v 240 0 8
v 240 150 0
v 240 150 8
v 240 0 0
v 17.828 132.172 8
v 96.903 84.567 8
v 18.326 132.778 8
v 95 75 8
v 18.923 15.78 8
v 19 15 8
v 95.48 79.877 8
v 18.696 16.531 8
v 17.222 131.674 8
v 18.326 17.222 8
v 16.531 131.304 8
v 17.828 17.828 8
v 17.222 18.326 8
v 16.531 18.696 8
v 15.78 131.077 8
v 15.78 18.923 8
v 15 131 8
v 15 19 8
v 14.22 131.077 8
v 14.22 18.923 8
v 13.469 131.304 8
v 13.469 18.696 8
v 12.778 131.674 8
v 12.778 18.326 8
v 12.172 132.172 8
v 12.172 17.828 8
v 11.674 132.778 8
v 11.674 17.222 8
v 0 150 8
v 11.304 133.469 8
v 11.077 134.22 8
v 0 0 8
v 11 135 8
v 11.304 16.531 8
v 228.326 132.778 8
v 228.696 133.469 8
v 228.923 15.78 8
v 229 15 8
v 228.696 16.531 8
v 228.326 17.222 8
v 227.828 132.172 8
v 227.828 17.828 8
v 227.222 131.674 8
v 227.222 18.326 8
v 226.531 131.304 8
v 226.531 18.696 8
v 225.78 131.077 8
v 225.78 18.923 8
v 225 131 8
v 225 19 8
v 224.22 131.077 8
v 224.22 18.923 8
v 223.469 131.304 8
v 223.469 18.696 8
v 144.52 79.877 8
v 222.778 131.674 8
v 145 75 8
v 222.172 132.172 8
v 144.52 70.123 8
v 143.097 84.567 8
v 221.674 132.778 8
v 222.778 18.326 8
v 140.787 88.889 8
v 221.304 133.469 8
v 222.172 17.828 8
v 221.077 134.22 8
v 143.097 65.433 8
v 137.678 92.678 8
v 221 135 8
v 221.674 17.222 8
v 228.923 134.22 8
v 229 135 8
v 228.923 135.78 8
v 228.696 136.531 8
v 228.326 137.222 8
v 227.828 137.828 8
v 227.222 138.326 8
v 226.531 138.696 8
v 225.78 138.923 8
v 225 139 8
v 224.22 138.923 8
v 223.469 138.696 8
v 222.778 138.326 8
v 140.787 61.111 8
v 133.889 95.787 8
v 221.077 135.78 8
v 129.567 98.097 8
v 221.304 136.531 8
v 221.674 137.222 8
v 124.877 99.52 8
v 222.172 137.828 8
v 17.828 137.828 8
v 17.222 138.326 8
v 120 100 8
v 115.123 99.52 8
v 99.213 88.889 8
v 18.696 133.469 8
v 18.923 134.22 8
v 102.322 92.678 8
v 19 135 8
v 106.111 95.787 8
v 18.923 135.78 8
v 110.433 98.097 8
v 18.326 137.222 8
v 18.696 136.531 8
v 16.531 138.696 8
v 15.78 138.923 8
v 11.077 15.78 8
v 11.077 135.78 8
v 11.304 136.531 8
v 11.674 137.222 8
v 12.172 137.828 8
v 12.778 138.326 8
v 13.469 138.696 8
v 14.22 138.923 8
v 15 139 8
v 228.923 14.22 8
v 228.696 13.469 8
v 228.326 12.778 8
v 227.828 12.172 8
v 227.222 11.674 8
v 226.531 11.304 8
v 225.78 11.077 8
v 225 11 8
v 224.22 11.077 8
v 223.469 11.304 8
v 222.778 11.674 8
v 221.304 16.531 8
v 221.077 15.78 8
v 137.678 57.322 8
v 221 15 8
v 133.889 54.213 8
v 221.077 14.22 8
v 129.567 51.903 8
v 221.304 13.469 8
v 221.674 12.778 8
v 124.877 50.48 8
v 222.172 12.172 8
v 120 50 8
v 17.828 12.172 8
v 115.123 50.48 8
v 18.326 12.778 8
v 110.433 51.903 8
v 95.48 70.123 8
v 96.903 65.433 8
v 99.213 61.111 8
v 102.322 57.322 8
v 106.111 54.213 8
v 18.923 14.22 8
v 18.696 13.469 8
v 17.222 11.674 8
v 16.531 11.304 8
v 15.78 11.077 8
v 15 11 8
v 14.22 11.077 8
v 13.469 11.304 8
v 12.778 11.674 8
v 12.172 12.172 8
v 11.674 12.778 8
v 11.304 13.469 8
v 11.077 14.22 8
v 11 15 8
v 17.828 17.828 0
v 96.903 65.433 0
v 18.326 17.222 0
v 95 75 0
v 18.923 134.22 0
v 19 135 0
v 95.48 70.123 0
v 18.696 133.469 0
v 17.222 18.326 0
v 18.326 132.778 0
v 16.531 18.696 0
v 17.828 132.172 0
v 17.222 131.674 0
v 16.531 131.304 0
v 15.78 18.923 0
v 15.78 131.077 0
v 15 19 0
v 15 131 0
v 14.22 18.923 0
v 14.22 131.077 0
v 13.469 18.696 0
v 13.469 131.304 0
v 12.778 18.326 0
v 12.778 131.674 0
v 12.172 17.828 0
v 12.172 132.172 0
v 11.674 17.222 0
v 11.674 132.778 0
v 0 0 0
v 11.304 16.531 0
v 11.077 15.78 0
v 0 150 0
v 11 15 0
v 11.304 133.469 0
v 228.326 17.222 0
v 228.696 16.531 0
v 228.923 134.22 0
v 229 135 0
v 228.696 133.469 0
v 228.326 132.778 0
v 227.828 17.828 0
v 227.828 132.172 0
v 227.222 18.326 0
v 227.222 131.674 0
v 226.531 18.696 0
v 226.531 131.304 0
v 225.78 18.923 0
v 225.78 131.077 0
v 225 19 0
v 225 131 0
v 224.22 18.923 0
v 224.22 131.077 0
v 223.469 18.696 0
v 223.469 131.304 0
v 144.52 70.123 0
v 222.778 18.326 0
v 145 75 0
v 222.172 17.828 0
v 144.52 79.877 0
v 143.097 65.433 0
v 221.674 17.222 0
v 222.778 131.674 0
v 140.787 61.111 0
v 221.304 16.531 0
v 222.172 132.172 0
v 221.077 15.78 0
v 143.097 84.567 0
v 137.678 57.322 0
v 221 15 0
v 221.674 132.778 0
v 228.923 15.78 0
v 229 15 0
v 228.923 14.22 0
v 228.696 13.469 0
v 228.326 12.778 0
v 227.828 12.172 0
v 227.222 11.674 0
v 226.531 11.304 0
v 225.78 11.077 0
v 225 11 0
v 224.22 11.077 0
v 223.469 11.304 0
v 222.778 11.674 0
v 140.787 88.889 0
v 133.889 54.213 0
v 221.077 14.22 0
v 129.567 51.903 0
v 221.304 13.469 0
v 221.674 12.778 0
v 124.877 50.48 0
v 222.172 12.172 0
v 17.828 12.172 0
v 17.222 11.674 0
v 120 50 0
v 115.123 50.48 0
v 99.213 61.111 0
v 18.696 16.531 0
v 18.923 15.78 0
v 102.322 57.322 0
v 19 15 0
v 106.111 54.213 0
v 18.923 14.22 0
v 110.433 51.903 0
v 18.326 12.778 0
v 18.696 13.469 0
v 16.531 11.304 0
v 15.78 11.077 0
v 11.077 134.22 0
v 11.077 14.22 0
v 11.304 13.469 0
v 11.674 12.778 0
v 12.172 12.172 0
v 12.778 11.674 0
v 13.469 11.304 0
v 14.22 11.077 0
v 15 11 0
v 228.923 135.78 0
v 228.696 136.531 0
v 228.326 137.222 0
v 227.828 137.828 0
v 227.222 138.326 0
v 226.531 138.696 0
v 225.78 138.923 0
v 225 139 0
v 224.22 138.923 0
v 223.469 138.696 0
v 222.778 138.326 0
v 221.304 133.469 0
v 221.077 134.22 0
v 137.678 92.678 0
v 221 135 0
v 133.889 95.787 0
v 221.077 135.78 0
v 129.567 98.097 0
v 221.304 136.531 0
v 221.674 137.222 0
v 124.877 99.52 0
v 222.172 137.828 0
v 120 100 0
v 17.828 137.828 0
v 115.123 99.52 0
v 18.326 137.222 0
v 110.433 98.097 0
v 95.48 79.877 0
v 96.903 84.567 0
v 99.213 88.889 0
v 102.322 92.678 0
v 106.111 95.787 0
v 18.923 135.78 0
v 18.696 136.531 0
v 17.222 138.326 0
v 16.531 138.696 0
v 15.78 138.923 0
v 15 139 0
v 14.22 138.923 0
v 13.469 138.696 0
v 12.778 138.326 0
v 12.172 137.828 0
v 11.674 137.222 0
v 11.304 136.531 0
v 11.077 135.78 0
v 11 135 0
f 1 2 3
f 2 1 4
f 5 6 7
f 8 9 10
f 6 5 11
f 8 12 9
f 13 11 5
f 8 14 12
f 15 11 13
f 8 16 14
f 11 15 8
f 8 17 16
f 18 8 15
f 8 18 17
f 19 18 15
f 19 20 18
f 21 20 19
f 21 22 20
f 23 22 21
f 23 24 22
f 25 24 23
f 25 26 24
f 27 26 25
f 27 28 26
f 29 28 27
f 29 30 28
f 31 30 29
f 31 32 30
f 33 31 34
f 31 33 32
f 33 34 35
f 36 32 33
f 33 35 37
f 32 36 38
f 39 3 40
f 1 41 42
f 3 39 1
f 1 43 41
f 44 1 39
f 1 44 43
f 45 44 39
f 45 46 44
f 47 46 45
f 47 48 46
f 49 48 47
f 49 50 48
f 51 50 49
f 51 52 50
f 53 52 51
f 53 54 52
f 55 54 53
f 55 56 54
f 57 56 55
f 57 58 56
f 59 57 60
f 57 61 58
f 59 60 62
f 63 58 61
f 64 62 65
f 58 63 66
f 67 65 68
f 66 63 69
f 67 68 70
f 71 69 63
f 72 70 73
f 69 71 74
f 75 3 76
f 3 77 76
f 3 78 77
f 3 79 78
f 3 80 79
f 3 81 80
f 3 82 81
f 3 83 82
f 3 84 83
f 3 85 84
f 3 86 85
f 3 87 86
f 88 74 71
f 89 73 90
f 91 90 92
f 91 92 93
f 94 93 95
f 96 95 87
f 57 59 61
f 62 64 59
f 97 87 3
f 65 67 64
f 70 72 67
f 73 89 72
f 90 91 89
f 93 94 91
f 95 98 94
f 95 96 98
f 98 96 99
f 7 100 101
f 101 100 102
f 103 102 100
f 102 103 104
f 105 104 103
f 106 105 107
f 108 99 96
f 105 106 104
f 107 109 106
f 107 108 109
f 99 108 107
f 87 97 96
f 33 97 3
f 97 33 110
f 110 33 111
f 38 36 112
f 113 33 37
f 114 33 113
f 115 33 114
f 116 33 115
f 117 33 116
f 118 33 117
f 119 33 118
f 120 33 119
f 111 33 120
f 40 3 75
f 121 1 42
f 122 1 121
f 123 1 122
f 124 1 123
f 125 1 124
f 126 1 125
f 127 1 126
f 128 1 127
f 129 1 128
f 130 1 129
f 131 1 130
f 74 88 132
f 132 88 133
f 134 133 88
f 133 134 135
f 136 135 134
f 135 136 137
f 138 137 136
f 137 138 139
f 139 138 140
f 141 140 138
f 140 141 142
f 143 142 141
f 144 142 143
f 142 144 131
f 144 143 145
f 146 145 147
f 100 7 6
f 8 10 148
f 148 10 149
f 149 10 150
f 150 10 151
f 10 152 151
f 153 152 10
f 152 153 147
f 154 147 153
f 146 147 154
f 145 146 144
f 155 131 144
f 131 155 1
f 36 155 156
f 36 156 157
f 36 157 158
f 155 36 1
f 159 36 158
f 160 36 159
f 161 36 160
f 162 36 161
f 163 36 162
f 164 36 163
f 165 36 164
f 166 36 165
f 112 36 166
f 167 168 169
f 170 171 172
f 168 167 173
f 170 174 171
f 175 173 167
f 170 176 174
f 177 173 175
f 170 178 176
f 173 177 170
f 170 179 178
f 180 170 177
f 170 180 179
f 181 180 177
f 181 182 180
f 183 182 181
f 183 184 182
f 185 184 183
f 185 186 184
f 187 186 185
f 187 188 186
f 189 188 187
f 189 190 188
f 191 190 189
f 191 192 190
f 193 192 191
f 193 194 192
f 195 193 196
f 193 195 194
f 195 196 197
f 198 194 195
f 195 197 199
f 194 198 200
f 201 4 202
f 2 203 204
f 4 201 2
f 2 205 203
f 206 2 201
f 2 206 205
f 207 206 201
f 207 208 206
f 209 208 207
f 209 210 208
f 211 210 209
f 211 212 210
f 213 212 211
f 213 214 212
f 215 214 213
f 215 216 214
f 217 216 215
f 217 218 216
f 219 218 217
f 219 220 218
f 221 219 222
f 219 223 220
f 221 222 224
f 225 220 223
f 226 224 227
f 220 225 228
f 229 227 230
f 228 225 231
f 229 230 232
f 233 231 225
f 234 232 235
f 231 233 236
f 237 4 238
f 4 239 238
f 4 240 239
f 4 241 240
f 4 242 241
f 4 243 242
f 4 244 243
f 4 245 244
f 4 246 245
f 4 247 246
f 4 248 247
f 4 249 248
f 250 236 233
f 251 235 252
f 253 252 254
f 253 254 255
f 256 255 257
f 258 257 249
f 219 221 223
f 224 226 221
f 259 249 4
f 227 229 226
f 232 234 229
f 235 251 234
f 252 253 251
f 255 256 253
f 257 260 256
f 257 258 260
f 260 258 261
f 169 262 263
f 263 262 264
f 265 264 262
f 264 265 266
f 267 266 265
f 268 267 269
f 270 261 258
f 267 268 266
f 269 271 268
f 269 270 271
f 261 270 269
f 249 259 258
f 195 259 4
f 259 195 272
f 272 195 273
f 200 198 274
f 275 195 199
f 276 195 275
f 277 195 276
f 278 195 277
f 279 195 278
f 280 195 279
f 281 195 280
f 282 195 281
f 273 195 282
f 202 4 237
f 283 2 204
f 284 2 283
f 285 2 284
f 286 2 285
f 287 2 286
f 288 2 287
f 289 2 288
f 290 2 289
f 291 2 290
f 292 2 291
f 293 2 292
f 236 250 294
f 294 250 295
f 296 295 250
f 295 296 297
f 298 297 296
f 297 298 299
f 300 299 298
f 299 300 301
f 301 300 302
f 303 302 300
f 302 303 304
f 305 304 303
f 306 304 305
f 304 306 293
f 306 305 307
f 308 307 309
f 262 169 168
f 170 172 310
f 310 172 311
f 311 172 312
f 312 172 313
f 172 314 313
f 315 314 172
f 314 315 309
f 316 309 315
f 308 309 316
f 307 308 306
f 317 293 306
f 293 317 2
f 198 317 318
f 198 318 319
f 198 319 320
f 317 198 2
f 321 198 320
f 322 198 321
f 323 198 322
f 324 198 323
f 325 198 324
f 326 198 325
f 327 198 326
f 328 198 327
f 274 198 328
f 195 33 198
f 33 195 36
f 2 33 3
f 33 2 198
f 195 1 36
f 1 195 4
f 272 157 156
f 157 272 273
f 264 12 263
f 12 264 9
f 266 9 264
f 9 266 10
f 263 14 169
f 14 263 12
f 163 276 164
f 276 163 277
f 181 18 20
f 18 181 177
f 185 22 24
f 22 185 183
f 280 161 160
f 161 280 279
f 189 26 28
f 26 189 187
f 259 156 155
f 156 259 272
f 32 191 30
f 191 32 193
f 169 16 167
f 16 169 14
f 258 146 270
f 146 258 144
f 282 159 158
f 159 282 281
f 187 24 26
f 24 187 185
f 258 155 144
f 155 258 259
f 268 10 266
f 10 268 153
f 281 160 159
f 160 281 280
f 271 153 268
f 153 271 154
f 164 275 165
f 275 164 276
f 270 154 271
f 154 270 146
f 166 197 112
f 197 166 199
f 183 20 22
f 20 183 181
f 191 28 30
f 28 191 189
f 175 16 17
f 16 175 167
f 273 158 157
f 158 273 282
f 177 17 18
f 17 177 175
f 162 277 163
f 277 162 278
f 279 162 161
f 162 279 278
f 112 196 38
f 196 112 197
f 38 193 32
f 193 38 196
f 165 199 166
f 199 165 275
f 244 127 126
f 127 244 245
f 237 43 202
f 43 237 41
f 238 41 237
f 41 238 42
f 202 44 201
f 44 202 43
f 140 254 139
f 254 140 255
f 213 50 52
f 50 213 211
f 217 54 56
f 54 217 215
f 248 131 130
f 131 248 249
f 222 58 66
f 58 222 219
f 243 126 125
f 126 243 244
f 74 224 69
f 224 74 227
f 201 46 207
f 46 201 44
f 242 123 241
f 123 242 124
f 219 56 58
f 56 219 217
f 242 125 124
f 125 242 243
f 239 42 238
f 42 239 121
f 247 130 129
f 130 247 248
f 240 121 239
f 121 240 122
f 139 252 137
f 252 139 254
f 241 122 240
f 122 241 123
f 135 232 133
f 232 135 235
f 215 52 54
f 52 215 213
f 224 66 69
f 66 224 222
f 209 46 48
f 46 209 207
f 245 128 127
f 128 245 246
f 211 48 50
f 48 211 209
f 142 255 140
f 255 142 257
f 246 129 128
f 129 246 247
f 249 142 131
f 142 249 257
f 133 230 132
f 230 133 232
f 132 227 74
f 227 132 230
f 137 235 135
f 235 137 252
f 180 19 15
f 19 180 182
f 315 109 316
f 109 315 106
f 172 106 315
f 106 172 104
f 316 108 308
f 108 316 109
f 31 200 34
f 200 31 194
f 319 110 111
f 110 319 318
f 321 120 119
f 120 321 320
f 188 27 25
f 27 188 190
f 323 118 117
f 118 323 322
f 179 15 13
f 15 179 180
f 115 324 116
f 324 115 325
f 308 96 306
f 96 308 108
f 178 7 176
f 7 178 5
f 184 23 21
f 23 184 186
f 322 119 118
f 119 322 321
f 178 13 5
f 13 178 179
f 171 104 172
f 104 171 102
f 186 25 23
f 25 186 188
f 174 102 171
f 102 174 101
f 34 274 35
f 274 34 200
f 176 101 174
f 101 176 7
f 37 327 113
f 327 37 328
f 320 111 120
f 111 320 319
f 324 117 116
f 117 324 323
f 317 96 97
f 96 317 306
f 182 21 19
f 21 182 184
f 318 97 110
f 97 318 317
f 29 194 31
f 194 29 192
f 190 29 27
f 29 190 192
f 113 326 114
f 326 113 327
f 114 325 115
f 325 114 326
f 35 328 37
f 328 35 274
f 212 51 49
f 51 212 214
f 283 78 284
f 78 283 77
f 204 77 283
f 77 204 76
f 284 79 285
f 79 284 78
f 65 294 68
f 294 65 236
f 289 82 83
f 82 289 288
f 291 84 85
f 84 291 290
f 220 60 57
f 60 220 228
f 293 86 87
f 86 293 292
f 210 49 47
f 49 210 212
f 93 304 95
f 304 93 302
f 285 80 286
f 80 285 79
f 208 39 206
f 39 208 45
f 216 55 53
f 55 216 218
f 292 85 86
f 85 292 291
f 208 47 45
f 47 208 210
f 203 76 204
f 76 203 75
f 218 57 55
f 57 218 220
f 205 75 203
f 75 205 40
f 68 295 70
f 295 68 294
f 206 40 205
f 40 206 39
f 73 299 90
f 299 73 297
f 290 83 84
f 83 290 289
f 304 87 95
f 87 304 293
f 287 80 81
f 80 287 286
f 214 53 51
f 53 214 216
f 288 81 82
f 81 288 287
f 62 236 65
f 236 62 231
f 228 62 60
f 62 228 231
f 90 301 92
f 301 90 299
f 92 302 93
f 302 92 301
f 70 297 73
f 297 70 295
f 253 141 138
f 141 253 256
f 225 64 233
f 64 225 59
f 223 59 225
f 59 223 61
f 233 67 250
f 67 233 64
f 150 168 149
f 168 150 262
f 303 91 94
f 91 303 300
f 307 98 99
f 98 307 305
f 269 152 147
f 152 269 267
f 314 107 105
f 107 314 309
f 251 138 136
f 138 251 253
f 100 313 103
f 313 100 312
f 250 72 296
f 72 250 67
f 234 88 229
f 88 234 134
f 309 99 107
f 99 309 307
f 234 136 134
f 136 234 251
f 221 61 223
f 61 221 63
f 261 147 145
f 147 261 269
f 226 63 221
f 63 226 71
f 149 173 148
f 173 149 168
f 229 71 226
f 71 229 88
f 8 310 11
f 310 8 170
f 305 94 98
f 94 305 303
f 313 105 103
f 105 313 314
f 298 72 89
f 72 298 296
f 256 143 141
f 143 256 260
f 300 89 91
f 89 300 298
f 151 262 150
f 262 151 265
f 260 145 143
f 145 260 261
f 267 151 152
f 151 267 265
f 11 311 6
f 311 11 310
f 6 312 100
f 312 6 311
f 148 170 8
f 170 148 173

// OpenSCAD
$fn = 32;

// ----------------------------------------------------------------------
// Big plate: 200-250 mm adapter plate
// ----------------------------------------------------------------------

// --- parameters (mm) ---
plate_l = 240;            // plate length, X
plate_w = 150;            // plate width, Y
plate_t = 8;              // plate thickness, Z
corner_d = 8;             // corner hole diameter
corner_in = 15;           // corner hole inset from the edges
bore_d = 50;              // central bore

difference() {
  cube([plate_l, plate_w, plate_t]);
  translate([corner_in, corner_in, -1]) cylinder(h = plate_t + 2, d = corner_d);
  translate([plate_l - corner_in, corner_in, -1]) cylinder(h = plate_t + 2, d = corner_d);
  translate([corner_in, plate_w - corner_in, -1]) cylinder(h = plate_t + 2, d = corner_d);
  translate([plate_l - corner_in, plate_w - corner_in, -1]) cylinder(h = plate_t + 2, d = corner_d);
  translate([plate_l / 2, plate_w / 2, -1]) cylinder(h = plate_t + 2, d = bore_d);
}
